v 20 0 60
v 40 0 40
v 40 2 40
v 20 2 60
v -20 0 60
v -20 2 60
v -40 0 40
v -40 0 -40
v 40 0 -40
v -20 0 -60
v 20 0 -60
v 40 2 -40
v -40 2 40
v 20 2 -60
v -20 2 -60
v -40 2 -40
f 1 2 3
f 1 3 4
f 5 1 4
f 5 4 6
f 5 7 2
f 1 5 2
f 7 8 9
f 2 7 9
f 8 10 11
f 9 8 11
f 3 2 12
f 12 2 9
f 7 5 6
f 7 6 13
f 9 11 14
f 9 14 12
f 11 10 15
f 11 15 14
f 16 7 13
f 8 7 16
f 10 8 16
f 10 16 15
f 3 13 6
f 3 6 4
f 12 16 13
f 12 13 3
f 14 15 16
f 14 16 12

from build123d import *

# Parameters (mm, degrees)
BOSS_EXTRUDE1_DEPTH = 2


with BuildPart() as part:
    # Sketch1 → Boss-Extrude1 (new body)
    with BuildSketch(Plane(origin=(0, 0, 0), x_dir=(1, 0, 0), z_dir=(0, 1, 0))):
        Polygon((-20, 60), (-40, 40), (-40, -40), (-20, -60), (20, -60), (40, -40), (40, 40), (20, 60), align=None)
    extrude(amount=BOSS_EXTRUDE1_DEPTH)


solid = part.part
